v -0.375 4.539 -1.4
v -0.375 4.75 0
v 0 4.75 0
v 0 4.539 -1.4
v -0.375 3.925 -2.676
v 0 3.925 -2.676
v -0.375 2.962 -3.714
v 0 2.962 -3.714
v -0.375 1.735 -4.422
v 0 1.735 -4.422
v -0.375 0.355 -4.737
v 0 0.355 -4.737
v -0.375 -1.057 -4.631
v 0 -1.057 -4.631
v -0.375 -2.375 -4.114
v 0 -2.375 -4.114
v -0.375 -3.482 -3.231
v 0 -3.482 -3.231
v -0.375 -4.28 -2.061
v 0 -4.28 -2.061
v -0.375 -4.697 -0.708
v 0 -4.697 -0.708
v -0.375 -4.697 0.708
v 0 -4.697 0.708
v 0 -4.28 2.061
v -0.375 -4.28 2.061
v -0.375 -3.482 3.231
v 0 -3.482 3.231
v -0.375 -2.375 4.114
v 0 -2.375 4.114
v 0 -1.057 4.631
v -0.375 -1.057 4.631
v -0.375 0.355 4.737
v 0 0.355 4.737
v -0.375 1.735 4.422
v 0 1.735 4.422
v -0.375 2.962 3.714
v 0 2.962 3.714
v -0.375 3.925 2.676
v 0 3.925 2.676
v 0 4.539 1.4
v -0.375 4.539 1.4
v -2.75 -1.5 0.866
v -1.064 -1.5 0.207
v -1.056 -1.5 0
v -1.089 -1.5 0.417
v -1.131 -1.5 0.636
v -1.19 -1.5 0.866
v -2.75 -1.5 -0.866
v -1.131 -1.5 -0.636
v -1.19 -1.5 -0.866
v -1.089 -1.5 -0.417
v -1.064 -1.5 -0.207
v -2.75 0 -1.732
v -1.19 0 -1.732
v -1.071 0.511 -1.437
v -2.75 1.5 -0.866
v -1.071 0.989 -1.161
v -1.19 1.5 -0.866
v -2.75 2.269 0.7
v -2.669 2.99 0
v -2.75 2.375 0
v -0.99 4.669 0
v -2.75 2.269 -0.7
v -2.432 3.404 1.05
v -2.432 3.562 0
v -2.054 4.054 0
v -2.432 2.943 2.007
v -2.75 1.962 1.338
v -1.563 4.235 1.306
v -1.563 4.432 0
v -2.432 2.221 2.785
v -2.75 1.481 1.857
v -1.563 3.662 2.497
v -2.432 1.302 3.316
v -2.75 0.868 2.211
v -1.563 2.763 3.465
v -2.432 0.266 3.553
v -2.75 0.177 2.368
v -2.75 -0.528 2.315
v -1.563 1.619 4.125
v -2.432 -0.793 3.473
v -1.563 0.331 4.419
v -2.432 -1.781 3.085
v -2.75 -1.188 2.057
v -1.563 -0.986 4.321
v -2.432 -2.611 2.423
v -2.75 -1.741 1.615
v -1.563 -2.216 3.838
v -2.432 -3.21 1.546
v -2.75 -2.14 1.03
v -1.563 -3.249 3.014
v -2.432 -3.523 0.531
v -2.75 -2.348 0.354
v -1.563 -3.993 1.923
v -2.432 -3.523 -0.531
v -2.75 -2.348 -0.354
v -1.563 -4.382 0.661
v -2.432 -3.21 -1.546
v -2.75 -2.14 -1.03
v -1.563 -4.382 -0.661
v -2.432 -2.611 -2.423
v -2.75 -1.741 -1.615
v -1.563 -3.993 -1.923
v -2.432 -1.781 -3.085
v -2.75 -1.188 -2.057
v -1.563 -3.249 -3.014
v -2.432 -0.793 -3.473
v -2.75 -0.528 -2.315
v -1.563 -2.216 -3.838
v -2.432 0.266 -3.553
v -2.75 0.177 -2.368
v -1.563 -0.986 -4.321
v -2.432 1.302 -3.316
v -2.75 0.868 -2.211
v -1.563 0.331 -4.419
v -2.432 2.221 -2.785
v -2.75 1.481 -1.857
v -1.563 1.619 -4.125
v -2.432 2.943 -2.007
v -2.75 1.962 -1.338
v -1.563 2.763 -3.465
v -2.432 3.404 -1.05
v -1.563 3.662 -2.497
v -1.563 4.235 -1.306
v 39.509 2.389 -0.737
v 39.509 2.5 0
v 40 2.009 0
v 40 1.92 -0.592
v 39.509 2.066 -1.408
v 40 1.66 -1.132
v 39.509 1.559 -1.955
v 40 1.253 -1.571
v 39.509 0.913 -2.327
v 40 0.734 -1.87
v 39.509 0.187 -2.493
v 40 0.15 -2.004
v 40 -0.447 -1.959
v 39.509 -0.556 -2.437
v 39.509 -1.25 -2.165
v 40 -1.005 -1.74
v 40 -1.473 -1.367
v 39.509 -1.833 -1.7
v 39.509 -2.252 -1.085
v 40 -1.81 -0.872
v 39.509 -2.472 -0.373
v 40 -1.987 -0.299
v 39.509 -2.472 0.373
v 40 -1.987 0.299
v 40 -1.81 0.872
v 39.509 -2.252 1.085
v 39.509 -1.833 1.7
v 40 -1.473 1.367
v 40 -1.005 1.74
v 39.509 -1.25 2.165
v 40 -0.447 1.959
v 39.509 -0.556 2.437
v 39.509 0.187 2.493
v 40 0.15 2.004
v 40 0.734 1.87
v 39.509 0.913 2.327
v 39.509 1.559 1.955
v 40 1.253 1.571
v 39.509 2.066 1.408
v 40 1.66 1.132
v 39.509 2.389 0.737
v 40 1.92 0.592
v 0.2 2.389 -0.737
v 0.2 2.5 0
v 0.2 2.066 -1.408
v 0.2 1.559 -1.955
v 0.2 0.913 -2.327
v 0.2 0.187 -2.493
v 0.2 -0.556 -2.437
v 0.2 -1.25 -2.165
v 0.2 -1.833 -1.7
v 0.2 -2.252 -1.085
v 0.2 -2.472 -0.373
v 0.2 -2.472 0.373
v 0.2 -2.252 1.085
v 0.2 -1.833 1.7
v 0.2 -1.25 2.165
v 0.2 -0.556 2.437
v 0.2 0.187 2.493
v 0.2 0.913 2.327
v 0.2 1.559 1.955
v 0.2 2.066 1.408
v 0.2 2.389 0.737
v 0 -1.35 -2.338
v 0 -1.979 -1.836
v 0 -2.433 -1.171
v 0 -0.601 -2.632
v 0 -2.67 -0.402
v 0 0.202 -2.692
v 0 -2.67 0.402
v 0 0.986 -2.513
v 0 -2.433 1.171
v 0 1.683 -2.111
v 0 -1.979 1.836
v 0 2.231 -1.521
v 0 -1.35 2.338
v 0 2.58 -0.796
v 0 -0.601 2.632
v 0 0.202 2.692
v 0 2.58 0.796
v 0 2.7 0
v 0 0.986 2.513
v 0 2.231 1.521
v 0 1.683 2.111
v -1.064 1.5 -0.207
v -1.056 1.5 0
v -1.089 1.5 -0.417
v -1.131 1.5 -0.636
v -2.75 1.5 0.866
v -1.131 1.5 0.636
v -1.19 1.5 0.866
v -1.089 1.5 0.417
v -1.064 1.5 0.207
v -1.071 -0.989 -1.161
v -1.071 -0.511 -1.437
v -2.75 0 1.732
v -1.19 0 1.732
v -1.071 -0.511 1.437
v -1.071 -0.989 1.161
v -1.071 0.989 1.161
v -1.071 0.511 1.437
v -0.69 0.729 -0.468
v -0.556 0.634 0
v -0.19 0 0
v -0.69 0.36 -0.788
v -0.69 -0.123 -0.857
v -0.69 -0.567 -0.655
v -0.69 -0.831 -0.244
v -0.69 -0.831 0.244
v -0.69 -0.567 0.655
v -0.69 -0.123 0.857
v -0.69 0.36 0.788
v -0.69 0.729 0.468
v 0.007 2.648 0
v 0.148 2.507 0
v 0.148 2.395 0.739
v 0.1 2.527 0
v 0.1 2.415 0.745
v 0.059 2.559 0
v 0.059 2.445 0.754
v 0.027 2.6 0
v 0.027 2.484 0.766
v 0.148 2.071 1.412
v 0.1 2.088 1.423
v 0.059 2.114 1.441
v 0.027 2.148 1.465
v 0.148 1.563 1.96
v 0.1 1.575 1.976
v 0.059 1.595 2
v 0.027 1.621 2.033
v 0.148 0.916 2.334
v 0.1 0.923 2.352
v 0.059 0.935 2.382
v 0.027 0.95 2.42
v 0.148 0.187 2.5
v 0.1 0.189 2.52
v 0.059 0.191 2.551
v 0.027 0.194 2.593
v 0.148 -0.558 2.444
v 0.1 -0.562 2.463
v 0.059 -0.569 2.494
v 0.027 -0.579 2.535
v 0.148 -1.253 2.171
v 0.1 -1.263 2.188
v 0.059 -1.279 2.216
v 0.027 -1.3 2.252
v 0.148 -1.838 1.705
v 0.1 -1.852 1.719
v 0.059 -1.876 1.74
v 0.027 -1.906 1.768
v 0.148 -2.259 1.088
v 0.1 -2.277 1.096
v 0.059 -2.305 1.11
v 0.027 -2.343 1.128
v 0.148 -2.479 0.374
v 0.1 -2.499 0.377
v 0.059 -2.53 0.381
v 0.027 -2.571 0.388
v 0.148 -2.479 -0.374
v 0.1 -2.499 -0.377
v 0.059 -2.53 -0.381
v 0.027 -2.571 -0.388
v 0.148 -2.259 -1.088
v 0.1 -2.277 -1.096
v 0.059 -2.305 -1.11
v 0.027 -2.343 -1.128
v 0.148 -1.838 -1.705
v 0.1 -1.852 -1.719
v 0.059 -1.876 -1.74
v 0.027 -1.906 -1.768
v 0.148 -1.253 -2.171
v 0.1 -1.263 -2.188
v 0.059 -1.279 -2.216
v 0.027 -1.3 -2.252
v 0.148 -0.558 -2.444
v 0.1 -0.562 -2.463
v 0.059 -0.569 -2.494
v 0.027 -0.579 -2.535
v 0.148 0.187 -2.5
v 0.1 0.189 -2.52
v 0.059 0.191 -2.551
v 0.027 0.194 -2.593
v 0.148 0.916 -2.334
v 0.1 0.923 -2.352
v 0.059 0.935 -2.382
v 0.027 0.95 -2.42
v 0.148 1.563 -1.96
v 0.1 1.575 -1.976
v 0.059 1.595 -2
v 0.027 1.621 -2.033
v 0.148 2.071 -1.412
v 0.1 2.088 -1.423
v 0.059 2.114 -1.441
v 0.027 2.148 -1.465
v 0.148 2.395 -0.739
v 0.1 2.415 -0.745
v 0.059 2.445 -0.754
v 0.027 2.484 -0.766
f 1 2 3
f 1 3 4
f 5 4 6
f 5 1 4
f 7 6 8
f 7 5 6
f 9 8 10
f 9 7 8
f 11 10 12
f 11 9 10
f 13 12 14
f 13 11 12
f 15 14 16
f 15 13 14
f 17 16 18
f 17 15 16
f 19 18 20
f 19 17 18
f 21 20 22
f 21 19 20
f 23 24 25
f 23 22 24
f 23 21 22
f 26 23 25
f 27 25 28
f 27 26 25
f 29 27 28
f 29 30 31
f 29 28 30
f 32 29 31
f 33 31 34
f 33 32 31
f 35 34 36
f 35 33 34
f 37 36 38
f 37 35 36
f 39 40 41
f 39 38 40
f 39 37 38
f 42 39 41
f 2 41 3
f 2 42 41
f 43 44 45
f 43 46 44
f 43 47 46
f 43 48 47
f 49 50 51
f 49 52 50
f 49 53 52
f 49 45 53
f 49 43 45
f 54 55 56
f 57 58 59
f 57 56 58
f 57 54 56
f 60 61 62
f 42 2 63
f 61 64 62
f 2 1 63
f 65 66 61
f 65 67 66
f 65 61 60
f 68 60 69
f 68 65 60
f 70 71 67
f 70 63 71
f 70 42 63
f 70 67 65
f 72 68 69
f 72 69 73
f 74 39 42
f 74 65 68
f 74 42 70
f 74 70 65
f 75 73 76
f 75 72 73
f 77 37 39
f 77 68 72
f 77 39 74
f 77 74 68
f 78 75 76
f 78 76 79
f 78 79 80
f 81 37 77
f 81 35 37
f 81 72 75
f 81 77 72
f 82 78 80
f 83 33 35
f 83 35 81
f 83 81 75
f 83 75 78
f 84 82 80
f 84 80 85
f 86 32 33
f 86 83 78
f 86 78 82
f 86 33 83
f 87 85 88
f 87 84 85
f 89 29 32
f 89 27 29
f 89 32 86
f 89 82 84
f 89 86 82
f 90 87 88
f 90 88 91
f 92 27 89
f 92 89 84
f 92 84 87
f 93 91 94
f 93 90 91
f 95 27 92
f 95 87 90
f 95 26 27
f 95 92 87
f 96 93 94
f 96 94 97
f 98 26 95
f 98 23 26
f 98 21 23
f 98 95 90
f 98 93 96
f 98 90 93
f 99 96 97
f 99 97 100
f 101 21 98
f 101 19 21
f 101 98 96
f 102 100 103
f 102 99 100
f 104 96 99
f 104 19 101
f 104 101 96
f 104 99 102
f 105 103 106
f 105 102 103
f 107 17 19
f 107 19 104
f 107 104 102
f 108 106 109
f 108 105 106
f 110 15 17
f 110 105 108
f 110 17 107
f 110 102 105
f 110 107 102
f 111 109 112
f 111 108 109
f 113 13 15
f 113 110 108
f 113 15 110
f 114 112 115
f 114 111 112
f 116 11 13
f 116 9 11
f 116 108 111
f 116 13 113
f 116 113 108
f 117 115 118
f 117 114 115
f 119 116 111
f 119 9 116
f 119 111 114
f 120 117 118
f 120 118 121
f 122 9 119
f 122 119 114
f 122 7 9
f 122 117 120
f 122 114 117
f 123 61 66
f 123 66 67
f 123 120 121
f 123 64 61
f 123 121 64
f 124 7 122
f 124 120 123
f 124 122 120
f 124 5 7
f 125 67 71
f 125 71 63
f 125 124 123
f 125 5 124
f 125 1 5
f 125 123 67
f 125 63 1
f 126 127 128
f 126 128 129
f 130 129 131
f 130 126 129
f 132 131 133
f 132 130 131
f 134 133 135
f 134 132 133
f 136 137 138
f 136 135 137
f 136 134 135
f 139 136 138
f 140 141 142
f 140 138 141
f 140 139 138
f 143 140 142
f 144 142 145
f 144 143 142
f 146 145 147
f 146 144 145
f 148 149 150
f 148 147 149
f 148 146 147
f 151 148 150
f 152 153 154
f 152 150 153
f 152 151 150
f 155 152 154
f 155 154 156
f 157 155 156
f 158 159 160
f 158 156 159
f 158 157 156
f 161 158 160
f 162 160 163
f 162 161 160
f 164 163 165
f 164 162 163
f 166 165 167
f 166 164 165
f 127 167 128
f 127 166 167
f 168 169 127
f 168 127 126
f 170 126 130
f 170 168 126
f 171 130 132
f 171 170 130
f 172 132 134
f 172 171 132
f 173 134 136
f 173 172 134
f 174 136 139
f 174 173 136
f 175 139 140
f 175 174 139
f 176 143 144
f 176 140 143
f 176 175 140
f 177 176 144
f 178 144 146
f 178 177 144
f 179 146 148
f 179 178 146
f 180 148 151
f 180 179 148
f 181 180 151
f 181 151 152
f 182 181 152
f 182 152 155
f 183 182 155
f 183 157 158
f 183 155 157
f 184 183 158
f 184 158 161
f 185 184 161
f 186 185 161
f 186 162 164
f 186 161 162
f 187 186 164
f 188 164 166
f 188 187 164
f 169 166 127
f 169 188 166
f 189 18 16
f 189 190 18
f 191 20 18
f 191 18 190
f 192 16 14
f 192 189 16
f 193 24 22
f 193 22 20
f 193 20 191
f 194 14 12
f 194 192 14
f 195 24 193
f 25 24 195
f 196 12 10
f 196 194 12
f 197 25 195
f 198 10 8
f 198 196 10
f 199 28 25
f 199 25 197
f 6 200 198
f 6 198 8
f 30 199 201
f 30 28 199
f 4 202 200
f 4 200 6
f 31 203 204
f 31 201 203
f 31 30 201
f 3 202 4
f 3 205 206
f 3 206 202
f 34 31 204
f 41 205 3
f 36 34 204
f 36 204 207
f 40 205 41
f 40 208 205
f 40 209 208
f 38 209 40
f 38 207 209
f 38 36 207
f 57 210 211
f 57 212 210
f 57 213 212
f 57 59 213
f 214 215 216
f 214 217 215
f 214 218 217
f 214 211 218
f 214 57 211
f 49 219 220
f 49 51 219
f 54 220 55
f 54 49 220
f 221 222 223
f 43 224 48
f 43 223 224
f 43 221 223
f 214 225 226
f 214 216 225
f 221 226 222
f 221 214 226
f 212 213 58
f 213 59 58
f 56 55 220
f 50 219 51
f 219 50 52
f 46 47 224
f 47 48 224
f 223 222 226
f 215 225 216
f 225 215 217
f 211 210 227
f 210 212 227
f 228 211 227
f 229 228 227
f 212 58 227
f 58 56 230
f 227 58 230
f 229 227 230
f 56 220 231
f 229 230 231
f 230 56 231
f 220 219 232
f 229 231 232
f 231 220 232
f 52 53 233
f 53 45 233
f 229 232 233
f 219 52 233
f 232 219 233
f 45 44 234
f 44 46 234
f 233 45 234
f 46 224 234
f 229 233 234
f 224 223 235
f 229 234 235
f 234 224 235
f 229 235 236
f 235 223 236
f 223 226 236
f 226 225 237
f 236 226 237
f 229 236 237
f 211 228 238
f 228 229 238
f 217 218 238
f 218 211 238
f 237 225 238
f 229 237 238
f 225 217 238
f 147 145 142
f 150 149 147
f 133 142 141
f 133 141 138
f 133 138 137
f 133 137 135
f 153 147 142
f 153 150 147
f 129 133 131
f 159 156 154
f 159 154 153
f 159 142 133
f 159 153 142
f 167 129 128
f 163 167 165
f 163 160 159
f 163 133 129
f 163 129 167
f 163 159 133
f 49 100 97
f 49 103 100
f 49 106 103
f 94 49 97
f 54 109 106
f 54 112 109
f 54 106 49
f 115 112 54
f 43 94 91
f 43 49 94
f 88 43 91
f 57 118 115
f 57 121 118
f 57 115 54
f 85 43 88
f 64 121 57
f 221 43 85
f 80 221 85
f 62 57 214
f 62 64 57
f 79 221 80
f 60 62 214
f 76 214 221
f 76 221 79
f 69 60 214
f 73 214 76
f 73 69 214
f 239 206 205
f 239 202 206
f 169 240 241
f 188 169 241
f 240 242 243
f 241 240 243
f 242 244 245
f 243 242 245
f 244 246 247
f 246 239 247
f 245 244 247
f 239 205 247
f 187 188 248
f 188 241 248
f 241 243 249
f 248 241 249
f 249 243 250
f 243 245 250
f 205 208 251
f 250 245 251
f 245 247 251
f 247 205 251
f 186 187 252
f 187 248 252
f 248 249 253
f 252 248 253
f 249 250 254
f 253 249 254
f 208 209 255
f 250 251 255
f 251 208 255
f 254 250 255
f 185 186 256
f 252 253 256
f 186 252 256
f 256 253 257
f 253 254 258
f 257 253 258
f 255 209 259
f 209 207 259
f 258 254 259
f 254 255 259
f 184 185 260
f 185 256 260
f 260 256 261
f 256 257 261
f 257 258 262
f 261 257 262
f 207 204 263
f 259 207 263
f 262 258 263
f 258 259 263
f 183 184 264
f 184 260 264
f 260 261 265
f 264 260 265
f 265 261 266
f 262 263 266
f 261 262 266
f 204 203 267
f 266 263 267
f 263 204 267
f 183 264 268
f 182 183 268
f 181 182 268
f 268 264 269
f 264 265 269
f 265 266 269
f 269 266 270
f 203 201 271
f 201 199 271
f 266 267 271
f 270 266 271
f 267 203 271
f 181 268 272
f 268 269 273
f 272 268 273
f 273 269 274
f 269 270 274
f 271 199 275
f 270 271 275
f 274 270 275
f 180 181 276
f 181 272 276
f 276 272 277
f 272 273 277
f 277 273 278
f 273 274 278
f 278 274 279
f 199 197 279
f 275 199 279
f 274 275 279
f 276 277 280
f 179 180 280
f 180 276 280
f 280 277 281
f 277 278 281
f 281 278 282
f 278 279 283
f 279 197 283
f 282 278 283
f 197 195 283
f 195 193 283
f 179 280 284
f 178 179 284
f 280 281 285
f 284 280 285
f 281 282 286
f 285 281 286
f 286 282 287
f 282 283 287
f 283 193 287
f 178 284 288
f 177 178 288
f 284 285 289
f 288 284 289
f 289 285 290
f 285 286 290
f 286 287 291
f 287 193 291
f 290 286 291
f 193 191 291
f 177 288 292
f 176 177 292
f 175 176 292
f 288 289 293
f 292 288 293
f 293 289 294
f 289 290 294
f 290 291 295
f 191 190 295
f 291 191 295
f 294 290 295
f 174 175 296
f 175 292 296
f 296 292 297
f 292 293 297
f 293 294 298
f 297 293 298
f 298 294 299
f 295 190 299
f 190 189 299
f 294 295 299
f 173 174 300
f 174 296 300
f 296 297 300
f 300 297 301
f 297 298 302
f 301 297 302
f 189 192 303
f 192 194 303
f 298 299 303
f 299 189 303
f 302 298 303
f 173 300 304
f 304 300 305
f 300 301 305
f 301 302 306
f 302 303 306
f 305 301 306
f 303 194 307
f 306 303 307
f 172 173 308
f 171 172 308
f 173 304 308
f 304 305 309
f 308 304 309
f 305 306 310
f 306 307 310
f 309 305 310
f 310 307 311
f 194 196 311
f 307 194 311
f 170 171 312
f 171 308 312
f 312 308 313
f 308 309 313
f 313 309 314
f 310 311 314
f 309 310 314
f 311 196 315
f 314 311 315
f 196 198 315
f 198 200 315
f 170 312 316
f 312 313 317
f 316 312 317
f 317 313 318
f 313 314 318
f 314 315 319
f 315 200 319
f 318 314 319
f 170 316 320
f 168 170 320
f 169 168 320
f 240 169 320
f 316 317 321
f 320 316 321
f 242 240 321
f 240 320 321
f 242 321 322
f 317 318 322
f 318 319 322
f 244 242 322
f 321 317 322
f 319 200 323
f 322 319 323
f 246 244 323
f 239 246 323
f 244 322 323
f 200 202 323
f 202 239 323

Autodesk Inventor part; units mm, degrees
ref_plane "YZ Plane" through (0, 0, 0) normal (1, 0, 0) x (0, 1, 0)
ref_plane "XZ Plane" through (0, 0, 0) normal (0, 1, 0) x (-1, 0, 0)
sketch "Sketch1" plane through (0, 0, 0) normal (0, 0, 1) x (1, 0, 0)
  line L0 (-0.19, 0) -> (40, 0)
  line L1 (40, 0) -> (40, 2.5)
  line L2 (40, 2.5) -> (1.6, 2.5)
  line L3 (1.6, 2.5) -> (1.1092, 2.5)
  line L4 (1.1092, 2.5) -> (0, 2.5)
  line L5 (0, 2.5) -> (0, 4.75)
  line L6 (0, 4.75) -> (-2.75, 4.75)
  line L7 (-2.75, 4.75) -> (-2.75, 1.7321)
  line L8 (-2.75, 1.7321) -> (-1.19, 1.7321)
  line L9 (-1.19, 1.7321) -> (-0.19, 0)
  line L10 (-11.3, 0) -> (48.55, 0) projected
  line L11 (0, -0.95) -> (0, 5.7) projected
  line L12 (1.6, 2.5) -> (0, 2.5) construction
  dimension "d0" = 38.4
  dimension "d1" = 0.4908
  dimension "d2" = 2.75
  dimension "d3" = 1.56
  dimension "d4" = 60
  dimension "d5" = 5
  dimension "d6" = 5
  dimension "d7" = 3.4641
  dimension "d8" = 9.5
  dimension "d19" = 40
revolve "Body" add sketch "Sketch1" angle 360 about axis through (-0.19, 0, 0) along (1, 0, 0)
sketch "Sketch2" plane through (-2.75, 0, 0) normal (-1, 0, 0) x (0, 0, 1)
  circle A0 centre (0, 0) radius 1.7321 projected
  line L0 (0, -6.65) -> (0, 6.65) projected
  line L1 (-6.65, 0) -> (6.65, 0) projected
  line L2 (1.7321, 0) -> (0.866, -1.5)
  line L3 (0.866, -1.5) -> (-0.866, -1.5)
  line L4 (-0.866, -1.5) -> (-1.7321, 0)
  line L5 (-1.7321, 0) -> (-0.866, 1.5)
  line L6 (-0.866, 1.5) -> (0.866, 1.5)
  line L7 (0.866, 1.5) -> (1.7321, 0)
extrude "Slot" add sketch "Sketch2" against normal up to next contours L7 A0 | A0 L2 | L6 L0 A0 | A0 L0 L3 | L0 L6 A0 | A0 L3 L0 | L4 A0 | A0 L5
fillet "Fillet1" radius 2.375 1 edges at (-2.75, -4.75, 0)
thread "Thread" size "M5x0.8" class "4g6g" standard "ANSI Metric M Profile" length 38.4
chamfer "Chamfer1" distance 0.4908 distance2 0.4908 1 edges at (40, -2.5, 0) measured on face at (40, 0.9945, 0.5526)
fillet "Fillet2" radius 0.2 1 edges at (0, -2.5, 0)
ref_plane "Work Plane1" through (30, 0, 0) normal (0, -0.5, 0.866) x (1, 0, 0)
equation "\"d0\" = GEL"
equation "\"d1\" = GAL"
equation "\"d2\" = KOH"
equation "\"d3\" = INTI"
equation "\"d5\" = GD"
equation "\"d6\" = BDM"
equation "\"d7\" = 1.1547 * SW"
equation "\"d8\" = KOD"
equation "\"d19\" = NLG"
equation "\"d16\" = RR"
equation "\"d12\" = GEL"
equation "\"d14\" = -0.5 * SPD + 0.5 * GD"
equation "\"d15\" = GUL"
equation "\"d29\" = R"
equation "\"GD\" = NND"
equation "\"NLG\" = 40"
equation "\"GEL\" = 38.4"
equation "\"KOD\" = 9.5"
equation "\"KOH\" = 2.75"
equation "\"INTI\" = 1.56"
equation "\"GAL\" = 0.61345 * PTC"
equation "\"GUL\" = 0.61345 * PTC"
equation "\"BDM\" = NND"
equation "\"SW\" = 3"
equation "\"RR\" = 2.375"
equation "\"SPD\" = 4.01848"
equation "\"d28\" = R"
equation "\"R\" = 0.2"
equation "\"TOA\" = 30deg"
equation "\"THREADDIA\" = 5"
equation "\"KOD1\" = KOD - 2 * RR"
equation "\"PTC\" = 0.8"
equation "\"NND\" = 5"
equation "\"E0\" = 1.155 * SW"
equation "\"GD1\" = THREADDIA - 1.2269 * PTC"
properties part number "ANSI B18.3.4M - M5 x 0.8 x 40" material "Steel, Mild"
